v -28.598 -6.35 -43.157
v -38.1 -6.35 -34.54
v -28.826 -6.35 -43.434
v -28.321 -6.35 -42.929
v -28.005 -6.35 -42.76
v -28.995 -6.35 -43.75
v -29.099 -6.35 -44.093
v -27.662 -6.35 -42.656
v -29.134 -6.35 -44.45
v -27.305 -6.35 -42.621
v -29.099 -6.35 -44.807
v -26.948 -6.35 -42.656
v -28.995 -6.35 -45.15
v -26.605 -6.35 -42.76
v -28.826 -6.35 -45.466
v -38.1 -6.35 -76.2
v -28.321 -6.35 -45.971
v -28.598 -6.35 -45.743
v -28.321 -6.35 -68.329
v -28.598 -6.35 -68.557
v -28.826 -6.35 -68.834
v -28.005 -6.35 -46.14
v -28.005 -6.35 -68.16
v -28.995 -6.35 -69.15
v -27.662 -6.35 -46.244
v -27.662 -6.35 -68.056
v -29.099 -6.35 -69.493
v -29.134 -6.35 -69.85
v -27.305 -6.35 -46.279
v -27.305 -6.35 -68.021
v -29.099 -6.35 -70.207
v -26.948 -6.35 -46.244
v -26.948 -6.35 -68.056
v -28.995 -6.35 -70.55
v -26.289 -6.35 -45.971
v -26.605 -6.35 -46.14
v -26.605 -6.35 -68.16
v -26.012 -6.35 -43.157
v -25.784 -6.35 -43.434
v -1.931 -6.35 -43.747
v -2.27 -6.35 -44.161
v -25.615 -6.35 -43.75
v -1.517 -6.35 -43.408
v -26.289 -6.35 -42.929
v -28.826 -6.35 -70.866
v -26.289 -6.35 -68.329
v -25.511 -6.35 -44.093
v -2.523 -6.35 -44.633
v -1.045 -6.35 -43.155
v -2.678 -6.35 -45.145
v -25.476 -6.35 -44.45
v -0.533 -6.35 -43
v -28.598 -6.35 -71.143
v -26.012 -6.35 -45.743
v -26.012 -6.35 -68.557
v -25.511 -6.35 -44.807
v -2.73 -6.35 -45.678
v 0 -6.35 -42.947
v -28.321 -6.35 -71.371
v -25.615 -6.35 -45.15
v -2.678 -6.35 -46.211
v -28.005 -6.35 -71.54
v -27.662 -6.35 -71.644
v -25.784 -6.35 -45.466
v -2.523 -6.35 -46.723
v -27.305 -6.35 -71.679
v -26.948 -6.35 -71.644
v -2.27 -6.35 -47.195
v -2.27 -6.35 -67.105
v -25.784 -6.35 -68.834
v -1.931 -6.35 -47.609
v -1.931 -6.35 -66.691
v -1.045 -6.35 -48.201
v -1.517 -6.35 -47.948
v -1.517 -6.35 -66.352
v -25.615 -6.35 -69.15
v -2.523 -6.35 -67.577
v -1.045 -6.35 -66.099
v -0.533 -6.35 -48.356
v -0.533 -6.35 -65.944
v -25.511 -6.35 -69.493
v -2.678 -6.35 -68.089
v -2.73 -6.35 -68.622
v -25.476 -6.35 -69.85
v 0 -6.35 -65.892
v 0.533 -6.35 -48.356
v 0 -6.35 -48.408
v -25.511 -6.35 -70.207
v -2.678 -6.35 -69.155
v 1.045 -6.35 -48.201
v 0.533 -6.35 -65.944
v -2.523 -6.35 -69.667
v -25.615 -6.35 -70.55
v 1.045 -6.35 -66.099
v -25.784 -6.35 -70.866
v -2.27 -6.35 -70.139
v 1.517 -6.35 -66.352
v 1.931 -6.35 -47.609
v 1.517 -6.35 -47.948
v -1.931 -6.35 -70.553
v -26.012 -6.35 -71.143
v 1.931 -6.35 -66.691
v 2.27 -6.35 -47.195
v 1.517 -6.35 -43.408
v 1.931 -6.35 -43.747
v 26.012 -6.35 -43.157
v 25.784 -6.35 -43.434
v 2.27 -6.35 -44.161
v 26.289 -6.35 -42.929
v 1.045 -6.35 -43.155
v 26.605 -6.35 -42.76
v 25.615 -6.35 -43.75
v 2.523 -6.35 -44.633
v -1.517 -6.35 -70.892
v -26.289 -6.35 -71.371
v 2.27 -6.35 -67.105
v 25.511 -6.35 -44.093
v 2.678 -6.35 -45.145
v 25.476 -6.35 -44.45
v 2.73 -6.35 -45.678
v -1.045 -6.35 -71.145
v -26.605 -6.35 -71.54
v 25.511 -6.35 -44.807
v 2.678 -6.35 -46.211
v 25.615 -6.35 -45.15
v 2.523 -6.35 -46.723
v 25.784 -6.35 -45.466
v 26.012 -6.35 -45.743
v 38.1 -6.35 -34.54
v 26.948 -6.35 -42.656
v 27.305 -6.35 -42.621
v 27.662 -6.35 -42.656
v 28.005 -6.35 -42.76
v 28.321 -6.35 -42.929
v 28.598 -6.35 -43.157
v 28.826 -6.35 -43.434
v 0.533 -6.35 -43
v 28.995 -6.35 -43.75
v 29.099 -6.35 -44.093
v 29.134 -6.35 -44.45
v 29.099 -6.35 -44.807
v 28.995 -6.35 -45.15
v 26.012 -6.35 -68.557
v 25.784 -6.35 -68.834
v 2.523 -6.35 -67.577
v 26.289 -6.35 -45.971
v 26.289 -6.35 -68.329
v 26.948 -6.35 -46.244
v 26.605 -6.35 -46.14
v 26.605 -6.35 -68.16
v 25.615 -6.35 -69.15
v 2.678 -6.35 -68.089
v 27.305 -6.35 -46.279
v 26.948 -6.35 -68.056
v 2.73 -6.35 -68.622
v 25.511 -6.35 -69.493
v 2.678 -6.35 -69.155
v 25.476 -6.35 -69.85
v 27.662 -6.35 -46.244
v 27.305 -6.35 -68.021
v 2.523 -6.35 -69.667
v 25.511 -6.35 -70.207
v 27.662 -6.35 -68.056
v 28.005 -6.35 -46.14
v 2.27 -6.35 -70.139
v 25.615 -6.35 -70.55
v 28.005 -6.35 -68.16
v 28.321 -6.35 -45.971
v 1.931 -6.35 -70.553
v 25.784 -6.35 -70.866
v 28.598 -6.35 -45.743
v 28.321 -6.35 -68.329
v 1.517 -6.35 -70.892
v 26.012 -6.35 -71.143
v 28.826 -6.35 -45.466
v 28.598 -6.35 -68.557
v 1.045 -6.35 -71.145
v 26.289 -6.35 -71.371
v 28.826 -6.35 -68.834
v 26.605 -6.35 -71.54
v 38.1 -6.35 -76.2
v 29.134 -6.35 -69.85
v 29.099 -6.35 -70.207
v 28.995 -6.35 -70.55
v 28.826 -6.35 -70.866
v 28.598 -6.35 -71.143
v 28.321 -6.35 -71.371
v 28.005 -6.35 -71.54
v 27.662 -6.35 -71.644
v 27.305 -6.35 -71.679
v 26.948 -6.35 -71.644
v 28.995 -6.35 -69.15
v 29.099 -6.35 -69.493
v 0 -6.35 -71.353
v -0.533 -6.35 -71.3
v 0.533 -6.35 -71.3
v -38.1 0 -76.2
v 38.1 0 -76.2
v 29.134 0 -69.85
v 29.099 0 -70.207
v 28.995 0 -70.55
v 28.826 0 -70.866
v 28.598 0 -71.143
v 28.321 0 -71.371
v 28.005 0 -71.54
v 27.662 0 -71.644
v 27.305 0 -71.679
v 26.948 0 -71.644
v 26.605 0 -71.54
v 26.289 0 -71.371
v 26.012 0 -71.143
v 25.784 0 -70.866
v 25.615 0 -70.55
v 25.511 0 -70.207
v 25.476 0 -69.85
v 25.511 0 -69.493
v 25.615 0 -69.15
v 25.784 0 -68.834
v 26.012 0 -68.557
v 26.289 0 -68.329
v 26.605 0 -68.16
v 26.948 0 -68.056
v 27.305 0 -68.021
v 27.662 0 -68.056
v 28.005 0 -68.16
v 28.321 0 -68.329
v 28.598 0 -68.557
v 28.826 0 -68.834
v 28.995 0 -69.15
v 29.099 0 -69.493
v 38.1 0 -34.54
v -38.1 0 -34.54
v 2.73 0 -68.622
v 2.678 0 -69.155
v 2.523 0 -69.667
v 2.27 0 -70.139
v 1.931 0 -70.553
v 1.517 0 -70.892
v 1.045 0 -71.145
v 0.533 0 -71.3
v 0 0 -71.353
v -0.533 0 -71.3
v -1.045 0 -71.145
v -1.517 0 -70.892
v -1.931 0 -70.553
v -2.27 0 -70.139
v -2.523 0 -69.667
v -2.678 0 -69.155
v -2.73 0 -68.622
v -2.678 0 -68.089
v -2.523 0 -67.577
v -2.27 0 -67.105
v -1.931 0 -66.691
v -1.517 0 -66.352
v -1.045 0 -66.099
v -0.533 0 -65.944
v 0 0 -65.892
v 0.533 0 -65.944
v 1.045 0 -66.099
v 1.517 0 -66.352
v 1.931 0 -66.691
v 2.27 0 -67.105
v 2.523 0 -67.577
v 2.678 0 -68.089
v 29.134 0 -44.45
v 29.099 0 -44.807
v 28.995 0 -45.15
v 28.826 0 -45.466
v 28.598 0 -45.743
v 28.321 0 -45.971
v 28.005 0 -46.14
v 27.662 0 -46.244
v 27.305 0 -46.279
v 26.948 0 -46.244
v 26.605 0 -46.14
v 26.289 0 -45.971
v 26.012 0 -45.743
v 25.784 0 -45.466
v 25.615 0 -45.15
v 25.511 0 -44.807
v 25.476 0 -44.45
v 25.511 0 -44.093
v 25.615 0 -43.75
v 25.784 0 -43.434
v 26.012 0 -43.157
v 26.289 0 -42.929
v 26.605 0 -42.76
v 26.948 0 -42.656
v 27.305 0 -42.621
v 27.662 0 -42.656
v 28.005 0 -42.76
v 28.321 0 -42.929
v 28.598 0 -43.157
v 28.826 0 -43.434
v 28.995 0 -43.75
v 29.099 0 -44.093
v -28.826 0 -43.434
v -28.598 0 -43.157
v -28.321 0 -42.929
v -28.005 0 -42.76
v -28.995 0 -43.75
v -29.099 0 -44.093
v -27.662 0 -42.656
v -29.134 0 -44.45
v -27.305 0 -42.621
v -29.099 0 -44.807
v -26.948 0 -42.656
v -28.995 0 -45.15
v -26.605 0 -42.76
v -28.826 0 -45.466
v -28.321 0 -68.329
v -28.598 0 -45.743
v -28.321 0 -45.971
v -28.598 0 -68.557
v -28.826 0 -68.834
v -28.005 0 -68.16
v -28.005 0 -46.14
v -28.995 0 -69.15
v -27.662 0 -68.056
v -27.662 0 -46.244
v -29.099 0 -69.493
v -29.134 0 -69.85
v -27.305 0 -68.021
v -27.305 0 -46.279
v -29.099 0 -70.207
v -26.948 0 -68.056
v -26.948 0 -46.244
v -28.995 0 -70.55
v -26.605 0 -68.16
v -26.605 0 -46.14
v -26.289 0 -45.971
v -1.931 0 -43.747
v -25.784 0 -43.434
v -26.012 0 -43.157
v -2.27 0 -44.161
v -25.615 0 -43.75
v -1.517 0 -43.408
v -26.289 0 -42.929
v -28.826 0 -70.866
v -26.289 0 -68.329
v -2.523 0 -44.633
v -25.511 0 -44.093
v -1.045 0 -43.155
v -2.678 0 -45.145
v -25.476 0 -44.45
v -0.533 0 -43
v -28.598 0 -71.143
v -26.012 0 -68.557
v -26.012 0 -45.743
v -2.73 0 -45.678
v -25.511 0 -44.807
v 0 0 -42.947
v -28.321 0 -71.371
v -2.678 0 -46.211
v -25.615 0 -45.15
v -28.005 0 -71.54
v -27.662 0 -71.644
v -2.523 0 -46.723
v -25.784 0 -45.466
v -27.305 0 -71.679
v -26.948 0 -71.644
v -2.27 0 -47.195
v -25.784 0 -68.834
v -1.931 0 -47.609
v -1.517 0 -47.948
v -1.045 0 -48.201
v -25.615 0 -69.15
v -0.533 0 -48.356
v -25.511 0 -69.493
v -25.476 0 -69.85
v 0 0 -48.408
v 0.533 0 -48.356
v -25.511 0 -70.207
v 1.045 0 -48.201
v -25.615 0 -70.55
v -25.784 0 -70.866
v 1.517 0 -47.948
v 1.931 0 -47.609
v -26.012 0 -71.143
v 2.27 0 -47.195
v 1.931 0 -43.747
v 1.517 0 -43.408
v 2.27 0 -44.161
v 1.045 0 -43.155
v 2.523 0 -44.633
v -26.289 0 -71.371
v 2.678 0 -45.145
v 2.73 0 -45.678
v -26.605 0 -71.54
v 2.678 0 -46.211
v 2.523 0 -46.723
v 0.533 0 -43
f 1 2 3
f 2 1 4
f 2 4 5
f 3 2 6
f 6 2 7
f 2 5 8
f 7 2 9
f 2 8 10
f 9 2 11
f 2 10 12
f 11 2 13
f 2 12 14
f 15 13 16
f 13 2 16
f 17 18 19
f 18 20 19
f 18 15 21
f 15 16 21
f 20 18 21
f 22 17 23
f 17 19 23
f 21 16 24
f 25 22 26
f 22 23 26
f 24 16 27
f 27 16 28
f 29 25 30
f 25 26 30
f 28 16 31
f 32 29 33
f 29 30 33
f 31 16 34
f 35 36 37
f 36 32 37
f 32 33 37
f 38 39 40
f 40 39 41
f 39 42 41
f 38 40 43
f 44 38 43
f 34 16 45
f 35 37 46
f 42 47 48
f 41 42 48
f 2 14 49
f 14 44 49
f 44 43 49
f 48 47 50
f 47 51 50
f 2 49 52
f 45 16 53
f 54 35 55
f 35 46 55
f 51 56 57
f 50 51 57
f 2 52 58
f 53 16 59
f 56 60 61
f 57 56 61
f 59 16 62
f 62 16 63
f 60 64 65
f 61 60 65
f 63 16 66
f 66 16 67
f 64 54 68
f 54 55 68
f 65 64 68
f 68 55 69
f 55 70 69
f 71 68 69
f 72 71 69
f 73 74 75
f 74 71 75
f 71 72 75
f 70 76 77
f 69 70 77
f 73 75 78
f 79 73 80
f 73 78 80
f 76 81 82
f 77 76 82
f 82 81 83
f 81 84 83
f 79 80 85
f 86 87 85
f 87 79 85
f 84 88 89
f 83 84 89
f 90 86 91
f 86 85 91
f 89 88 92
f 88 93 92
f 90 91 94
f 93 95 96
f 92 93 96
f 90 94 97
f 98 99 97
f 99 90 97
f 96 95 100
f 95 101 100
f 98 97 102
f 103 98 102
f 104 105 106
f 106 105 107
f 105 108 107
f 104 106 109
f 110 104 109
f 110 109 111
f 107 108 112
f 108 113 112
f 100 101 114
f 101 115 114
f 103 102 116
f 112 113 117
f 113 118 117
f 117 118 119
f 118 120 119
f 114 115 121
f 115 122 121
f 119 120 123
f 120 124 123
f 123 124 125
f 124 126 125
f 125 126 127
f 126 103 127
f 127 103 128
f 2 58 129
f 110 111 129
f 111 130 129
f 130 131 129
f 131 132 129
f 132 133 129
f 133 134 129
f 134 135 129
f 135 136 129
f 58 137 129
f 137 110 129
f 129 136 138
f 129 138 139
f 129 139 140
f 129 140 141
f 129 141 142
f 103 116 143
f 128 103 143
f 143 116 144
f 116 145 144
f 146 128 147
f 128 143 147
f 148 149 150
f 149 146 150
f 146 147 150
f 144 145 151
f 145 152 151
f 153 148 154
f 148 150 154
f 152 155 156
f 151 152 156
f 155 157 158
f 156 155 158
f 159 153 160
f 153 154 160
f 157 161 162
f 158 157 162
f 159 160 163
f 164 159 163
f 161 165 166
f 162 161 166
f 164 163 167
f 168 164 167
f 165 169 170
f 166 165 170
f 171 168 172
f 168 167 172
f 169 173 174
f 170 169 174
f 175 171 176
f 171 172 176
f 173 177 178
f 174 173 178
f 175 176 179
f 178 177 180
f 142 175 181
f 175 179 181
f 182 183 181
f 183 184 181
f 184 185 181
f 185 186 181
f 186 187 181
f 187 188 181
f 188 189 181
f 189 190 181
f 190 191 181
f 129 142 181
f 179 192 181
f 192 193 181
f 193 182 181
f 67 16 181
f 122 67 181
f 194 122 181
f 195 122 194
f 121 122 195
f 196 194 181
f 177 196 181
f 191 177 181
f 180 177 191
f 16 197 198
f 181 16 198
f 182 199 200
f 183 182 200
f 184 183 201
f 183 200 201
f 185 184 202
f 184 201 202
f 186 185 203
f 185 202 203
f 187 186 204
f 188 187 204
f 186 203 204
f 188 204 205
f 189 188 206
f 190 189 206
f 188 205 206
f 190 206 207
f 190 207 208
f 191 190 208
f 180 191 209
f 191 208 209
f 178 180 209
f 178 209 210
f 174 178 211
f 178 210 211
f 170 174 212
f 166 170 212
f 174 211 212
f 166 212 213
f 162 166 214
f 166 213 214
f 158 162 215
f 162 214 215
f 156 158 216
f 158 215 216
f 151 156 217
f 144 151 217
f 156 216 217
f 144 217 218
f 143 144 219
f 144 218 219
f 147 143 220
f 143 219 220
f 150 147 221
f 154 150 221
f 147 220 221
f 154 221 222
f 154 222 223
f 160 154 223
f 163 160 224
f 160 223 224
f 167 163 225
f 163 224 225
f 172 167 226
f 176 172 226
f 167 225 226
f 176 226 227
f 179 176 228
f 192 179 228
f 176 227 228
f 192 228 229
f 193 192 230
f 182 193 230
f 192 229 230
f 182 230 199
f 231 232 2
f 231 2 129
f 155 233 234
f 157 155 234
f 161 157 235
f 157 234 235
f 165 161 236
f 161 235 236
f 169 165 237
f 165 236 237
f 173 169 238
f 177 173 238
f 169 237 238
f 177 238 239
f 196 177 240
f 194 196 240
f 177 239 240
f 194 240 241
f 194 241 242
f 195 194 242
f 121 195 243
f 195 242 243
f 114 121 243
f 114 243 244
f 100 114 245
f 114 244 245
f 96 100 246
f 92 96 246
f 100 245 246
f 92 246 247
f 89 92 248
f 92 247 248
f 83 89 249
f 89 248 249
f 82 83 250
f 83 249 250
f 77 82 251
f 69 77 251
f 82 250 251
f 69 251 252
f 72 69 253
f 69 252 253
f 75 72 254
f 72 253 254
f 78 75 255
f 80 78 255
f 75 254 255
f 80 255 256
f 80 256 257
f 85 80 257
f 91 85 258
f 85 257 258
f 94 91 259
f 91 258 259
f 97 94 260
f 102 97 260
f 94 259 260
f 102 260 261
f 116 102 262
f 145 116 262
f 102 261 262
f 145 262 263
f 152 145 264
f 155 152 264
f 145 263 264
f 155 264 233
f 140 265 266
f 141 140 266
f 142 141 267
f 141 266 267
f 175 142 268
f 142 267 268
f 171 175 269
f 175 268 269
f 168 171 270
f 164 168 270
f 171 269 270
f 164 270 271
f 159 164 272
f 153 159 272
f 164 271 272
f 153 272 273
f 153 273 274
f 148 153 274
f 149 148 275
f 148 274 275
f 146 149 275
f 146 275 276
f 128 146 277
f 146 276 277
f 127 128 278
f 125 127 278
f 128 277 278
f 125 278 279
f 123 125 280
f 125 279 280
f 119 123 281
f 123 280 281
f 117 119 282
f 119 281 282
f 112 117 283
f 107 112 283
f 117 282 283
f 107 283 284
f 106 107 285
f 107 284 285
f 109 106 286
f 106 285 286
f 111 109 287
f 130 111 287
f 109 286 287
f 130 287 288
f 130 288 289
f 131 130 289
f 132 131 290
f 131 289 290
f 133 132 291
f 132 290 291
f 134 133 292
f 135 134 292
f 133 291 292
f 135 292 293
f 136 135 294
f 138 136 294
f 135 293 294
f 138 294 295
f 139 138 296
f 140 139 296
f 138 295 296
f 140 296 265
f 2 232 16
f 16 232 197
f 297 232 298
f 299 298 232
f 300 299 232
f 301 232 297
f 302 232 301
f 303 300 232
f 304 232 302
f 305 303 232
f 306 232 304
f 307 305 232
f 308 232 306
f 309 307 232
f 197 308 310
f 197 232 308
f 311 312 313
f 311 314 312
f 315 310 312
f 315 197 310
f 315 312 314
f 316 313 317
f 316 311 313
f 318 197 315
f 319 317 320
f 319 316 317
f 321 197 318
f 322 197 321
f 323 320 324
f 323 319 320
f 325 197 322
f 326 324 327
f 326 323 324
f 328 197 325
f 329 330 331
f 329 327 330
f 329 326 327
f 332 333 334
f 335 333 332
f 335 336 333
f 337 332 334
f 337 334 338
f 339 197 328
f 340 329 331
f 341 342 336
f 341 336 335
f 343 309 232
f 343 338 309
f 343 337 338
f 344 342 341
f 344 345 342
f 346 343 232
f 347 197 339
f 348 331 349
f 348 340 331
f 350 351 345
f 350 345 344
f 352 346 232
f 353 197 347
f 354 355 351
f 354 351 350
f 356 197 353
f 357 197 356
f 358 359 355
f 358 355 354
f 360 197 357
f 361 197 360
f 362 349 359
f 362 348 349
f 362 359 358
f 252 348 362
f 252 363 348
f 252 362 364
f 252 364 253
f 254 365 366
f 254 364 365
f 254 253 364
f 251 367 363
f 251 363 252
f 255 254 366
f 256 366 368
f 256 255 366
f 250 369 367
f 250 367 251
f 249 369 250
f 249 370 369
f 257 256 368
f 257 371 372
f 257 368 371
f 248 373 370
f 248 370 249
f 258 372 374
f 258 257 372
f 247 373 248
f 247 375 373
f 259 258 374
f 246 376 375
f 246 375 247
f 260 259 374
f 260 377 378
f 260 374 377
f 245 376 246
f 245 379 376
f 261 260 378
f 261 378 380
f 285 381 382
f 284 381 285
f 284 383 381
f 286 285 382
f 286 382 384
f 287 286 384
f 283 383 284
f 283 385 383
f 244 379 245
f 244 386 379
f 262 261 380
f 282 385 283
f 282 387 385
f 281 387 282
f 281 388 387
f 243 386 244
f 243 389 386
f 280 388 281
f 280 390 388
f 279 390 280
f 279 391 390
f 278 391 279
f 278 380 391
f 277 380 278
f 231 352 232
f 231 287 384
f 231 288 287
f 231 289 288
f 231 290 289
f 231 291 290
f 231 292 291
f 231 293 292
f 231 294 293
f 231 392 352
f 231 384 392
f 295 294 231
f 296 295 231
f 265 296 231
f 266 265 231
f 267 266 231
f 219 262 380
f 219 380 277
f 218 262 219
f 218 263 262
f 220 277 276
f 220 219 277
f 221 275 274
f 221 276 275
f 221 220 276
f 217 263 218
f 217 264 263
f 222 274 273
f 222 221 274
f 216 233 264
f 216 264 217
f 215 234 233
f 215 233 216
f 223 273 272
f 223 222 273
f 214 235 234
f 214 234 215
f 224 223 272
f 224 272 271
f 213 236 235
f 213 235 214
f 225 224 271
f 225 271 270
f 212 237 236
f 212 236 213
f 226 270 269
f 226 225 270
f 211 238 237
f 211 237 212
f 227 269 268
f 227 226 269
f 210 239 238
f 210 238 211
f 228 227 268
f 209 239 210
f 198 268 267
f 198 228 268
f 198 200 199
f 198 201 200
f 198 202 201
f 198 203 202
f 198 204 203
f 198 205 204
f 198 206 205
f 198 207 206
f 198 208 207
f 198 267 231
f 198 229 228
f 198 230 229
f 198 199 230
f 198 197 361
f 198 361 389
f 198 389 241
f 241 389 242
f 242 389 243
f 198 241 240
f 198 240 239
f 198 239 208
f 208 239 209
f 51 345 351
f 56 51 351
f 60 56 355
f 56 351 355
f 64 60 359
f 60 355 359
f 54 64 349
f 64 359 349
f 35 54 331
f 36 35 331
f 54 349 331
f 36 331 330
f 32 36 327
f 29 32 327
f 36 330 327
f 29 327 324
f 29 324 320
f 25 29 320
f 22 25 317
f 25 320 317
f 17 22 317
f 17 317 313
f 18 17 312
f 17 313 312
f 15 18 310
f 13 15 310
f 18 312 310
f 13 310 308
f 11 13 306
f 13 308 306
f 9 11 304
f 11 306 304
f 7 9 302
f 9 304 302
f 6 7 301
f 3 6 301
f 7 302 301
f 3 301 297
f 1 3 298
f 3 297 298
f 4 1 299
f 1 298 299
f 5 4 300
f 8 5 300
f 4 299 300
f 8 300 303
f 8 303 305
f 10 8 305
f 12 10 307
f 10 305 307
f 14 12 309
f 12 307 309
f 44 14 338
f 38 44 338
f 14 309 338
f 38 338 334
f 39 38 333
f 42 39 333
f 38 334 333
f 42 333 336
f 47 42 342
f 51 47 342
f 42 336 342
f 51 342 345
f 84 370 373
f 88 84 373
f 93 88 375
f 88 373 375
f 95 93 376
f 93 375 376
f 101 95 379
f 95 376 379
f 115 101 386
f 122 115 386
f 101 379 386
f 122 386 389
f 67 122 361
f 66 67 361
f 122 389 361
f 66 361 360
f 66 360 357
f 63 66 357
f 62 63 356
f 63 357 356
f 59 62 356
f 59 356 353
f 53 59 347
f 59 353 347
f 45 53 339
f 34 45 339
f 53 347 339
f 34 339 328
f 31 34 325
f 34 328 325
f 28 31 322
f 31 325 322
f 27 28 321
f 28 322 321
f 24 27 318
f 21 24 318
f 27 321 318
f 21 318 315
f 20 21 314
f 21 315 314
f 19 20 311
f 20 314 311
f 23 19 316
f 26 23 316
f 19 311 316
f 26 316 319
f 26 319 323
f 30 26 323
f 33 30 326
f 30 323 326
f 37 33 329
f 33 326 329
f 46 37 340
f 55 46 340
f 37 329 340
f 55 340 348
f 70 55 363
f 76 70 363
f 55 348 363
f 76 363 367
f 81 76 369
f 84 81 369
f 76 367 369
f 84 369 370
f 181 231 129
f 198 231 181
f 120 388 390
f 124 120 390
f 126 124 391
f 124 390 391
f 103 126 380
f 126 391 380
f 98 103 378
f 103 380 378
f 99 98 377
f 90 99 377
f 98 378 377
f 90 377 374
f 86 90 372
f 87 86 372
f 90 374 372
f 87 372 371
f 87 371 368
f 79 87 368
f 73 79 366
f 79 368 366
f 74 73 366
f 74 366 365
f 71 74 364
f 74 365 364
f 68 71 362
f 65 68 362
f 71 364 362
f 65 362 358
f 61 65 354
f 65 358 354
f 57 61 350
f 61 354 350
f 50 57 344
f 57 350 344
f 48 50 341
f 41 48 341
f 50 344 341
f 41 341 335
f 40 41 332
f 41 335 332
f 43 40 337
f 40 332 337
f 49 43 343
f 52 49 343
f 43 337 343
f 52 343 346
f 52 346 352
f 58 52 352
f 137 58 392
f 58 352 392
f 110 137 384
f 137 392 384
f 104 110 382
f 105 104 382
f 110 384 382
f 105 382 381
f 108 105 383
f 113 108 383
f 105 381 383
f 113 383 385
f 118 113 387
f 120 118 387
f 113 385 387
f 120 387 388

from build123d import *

# Parameters (mm, degrees)
SKETCH1_W               = 76.2
SKETCH1_H               = 152.4
SKETCH1_R               = 2.7305
SKETCH1_R_2             = 1.8288
BOSS_EXTRUDE1_DEPTH     = 6.35
SKETCH2_W               = 76.2
SKETCH2_H               = 110.740191545
CUT_EXTRUDE1_DEPTH      = 1
CUT_EXTRUDE1_DEPTH_BACK = 7.35


with BuildPart() as part:
    # Sketch1 → Boss-Extrude1 (new body)
    with BuildSketch(Plane(origin=(0, 0, 0), x_dir=(1, 0, 0), z_dir=(0, 1, 0))):
        Rectangle(SKETCH1_W, SKETCH1_H)
        with Locations((0, 19.05)):
            Circle(SKETCH1_R, mode=Mode.SUBTRACT)
        with Locations((0, -19.05)):
            Circle(SKETCH1_R, mode=Mode.SUBTRACT)
        with Locations((0, -57.15)):
            Circle(SKETCH1_R, mode=Mode.SUBTRACT)
        with Locations((27.305, 44.45)):
            Circle(SKETCH1_R_2, mode=Mode.SUBTRACT)
        with Locations((27.305, 6.35)):
            Circle(SKETCH1_R_2, mode=Mode.SUBTRACT)
        with Locations((27.305, -31.75)):
            Circle(SKETCH1_R_2, mode=Mode.SUBTRACT)
        with Locations((-27.305, 6.35)):
            Circle(SKETCH1_R_2, mode=Mode.SUBTRACT)
        with Locations((-27.305, -31.75)):
            Circle(SKETCH1_R_2, mode=Mode.SUBTRACT)
        with Locations((-27.305, 44.45)):
            Circle(SKETCH1_R_2, mode=Mode.SUBTRACT)
        with Locations((0, 45.6779905)):
            Circle(SKETCH1_R, mode=Mode.SUBTRACT)
        with Locations((27.305, 69.85)):
            Circle(SKETCH1_R_2, mode=Mode.SUBTRACT)
        with Locations((-27.305, 69.85)):
            Circle(SKETCH1_R_2, mode=Mode.SUBTRACT)
        with Locations((0, 68.6220095)):
            Circle(SKETCH1_R, mode=Mode.SUBTRACT)
    extrude(amount=-BOSS_EXTRUDE1_DEPTH)

    # Sketch2 → Cut-Extrude1 (cut, two sides)
    with BuildSketch(Plane(origin=(0, 0, 0), x_dir=(1, 0, 0), z_dir=(0, 1, 0))) as cut_extrude1_sk:
        with Locations((0, -20.829904228)):
            Rectangle(SKETCH2_W, SKETCH2_H)
    extrude(amount=CUT_EXTRUDE1_DEPTH, mode=Mode.SUBTRACT)
    extrude(cut_extrude1_sk.sketch, amount=-CUT_EXTRUDE1_DEPTH_BACK, mode=Mode.SUBTRACT)


solid = part.part
